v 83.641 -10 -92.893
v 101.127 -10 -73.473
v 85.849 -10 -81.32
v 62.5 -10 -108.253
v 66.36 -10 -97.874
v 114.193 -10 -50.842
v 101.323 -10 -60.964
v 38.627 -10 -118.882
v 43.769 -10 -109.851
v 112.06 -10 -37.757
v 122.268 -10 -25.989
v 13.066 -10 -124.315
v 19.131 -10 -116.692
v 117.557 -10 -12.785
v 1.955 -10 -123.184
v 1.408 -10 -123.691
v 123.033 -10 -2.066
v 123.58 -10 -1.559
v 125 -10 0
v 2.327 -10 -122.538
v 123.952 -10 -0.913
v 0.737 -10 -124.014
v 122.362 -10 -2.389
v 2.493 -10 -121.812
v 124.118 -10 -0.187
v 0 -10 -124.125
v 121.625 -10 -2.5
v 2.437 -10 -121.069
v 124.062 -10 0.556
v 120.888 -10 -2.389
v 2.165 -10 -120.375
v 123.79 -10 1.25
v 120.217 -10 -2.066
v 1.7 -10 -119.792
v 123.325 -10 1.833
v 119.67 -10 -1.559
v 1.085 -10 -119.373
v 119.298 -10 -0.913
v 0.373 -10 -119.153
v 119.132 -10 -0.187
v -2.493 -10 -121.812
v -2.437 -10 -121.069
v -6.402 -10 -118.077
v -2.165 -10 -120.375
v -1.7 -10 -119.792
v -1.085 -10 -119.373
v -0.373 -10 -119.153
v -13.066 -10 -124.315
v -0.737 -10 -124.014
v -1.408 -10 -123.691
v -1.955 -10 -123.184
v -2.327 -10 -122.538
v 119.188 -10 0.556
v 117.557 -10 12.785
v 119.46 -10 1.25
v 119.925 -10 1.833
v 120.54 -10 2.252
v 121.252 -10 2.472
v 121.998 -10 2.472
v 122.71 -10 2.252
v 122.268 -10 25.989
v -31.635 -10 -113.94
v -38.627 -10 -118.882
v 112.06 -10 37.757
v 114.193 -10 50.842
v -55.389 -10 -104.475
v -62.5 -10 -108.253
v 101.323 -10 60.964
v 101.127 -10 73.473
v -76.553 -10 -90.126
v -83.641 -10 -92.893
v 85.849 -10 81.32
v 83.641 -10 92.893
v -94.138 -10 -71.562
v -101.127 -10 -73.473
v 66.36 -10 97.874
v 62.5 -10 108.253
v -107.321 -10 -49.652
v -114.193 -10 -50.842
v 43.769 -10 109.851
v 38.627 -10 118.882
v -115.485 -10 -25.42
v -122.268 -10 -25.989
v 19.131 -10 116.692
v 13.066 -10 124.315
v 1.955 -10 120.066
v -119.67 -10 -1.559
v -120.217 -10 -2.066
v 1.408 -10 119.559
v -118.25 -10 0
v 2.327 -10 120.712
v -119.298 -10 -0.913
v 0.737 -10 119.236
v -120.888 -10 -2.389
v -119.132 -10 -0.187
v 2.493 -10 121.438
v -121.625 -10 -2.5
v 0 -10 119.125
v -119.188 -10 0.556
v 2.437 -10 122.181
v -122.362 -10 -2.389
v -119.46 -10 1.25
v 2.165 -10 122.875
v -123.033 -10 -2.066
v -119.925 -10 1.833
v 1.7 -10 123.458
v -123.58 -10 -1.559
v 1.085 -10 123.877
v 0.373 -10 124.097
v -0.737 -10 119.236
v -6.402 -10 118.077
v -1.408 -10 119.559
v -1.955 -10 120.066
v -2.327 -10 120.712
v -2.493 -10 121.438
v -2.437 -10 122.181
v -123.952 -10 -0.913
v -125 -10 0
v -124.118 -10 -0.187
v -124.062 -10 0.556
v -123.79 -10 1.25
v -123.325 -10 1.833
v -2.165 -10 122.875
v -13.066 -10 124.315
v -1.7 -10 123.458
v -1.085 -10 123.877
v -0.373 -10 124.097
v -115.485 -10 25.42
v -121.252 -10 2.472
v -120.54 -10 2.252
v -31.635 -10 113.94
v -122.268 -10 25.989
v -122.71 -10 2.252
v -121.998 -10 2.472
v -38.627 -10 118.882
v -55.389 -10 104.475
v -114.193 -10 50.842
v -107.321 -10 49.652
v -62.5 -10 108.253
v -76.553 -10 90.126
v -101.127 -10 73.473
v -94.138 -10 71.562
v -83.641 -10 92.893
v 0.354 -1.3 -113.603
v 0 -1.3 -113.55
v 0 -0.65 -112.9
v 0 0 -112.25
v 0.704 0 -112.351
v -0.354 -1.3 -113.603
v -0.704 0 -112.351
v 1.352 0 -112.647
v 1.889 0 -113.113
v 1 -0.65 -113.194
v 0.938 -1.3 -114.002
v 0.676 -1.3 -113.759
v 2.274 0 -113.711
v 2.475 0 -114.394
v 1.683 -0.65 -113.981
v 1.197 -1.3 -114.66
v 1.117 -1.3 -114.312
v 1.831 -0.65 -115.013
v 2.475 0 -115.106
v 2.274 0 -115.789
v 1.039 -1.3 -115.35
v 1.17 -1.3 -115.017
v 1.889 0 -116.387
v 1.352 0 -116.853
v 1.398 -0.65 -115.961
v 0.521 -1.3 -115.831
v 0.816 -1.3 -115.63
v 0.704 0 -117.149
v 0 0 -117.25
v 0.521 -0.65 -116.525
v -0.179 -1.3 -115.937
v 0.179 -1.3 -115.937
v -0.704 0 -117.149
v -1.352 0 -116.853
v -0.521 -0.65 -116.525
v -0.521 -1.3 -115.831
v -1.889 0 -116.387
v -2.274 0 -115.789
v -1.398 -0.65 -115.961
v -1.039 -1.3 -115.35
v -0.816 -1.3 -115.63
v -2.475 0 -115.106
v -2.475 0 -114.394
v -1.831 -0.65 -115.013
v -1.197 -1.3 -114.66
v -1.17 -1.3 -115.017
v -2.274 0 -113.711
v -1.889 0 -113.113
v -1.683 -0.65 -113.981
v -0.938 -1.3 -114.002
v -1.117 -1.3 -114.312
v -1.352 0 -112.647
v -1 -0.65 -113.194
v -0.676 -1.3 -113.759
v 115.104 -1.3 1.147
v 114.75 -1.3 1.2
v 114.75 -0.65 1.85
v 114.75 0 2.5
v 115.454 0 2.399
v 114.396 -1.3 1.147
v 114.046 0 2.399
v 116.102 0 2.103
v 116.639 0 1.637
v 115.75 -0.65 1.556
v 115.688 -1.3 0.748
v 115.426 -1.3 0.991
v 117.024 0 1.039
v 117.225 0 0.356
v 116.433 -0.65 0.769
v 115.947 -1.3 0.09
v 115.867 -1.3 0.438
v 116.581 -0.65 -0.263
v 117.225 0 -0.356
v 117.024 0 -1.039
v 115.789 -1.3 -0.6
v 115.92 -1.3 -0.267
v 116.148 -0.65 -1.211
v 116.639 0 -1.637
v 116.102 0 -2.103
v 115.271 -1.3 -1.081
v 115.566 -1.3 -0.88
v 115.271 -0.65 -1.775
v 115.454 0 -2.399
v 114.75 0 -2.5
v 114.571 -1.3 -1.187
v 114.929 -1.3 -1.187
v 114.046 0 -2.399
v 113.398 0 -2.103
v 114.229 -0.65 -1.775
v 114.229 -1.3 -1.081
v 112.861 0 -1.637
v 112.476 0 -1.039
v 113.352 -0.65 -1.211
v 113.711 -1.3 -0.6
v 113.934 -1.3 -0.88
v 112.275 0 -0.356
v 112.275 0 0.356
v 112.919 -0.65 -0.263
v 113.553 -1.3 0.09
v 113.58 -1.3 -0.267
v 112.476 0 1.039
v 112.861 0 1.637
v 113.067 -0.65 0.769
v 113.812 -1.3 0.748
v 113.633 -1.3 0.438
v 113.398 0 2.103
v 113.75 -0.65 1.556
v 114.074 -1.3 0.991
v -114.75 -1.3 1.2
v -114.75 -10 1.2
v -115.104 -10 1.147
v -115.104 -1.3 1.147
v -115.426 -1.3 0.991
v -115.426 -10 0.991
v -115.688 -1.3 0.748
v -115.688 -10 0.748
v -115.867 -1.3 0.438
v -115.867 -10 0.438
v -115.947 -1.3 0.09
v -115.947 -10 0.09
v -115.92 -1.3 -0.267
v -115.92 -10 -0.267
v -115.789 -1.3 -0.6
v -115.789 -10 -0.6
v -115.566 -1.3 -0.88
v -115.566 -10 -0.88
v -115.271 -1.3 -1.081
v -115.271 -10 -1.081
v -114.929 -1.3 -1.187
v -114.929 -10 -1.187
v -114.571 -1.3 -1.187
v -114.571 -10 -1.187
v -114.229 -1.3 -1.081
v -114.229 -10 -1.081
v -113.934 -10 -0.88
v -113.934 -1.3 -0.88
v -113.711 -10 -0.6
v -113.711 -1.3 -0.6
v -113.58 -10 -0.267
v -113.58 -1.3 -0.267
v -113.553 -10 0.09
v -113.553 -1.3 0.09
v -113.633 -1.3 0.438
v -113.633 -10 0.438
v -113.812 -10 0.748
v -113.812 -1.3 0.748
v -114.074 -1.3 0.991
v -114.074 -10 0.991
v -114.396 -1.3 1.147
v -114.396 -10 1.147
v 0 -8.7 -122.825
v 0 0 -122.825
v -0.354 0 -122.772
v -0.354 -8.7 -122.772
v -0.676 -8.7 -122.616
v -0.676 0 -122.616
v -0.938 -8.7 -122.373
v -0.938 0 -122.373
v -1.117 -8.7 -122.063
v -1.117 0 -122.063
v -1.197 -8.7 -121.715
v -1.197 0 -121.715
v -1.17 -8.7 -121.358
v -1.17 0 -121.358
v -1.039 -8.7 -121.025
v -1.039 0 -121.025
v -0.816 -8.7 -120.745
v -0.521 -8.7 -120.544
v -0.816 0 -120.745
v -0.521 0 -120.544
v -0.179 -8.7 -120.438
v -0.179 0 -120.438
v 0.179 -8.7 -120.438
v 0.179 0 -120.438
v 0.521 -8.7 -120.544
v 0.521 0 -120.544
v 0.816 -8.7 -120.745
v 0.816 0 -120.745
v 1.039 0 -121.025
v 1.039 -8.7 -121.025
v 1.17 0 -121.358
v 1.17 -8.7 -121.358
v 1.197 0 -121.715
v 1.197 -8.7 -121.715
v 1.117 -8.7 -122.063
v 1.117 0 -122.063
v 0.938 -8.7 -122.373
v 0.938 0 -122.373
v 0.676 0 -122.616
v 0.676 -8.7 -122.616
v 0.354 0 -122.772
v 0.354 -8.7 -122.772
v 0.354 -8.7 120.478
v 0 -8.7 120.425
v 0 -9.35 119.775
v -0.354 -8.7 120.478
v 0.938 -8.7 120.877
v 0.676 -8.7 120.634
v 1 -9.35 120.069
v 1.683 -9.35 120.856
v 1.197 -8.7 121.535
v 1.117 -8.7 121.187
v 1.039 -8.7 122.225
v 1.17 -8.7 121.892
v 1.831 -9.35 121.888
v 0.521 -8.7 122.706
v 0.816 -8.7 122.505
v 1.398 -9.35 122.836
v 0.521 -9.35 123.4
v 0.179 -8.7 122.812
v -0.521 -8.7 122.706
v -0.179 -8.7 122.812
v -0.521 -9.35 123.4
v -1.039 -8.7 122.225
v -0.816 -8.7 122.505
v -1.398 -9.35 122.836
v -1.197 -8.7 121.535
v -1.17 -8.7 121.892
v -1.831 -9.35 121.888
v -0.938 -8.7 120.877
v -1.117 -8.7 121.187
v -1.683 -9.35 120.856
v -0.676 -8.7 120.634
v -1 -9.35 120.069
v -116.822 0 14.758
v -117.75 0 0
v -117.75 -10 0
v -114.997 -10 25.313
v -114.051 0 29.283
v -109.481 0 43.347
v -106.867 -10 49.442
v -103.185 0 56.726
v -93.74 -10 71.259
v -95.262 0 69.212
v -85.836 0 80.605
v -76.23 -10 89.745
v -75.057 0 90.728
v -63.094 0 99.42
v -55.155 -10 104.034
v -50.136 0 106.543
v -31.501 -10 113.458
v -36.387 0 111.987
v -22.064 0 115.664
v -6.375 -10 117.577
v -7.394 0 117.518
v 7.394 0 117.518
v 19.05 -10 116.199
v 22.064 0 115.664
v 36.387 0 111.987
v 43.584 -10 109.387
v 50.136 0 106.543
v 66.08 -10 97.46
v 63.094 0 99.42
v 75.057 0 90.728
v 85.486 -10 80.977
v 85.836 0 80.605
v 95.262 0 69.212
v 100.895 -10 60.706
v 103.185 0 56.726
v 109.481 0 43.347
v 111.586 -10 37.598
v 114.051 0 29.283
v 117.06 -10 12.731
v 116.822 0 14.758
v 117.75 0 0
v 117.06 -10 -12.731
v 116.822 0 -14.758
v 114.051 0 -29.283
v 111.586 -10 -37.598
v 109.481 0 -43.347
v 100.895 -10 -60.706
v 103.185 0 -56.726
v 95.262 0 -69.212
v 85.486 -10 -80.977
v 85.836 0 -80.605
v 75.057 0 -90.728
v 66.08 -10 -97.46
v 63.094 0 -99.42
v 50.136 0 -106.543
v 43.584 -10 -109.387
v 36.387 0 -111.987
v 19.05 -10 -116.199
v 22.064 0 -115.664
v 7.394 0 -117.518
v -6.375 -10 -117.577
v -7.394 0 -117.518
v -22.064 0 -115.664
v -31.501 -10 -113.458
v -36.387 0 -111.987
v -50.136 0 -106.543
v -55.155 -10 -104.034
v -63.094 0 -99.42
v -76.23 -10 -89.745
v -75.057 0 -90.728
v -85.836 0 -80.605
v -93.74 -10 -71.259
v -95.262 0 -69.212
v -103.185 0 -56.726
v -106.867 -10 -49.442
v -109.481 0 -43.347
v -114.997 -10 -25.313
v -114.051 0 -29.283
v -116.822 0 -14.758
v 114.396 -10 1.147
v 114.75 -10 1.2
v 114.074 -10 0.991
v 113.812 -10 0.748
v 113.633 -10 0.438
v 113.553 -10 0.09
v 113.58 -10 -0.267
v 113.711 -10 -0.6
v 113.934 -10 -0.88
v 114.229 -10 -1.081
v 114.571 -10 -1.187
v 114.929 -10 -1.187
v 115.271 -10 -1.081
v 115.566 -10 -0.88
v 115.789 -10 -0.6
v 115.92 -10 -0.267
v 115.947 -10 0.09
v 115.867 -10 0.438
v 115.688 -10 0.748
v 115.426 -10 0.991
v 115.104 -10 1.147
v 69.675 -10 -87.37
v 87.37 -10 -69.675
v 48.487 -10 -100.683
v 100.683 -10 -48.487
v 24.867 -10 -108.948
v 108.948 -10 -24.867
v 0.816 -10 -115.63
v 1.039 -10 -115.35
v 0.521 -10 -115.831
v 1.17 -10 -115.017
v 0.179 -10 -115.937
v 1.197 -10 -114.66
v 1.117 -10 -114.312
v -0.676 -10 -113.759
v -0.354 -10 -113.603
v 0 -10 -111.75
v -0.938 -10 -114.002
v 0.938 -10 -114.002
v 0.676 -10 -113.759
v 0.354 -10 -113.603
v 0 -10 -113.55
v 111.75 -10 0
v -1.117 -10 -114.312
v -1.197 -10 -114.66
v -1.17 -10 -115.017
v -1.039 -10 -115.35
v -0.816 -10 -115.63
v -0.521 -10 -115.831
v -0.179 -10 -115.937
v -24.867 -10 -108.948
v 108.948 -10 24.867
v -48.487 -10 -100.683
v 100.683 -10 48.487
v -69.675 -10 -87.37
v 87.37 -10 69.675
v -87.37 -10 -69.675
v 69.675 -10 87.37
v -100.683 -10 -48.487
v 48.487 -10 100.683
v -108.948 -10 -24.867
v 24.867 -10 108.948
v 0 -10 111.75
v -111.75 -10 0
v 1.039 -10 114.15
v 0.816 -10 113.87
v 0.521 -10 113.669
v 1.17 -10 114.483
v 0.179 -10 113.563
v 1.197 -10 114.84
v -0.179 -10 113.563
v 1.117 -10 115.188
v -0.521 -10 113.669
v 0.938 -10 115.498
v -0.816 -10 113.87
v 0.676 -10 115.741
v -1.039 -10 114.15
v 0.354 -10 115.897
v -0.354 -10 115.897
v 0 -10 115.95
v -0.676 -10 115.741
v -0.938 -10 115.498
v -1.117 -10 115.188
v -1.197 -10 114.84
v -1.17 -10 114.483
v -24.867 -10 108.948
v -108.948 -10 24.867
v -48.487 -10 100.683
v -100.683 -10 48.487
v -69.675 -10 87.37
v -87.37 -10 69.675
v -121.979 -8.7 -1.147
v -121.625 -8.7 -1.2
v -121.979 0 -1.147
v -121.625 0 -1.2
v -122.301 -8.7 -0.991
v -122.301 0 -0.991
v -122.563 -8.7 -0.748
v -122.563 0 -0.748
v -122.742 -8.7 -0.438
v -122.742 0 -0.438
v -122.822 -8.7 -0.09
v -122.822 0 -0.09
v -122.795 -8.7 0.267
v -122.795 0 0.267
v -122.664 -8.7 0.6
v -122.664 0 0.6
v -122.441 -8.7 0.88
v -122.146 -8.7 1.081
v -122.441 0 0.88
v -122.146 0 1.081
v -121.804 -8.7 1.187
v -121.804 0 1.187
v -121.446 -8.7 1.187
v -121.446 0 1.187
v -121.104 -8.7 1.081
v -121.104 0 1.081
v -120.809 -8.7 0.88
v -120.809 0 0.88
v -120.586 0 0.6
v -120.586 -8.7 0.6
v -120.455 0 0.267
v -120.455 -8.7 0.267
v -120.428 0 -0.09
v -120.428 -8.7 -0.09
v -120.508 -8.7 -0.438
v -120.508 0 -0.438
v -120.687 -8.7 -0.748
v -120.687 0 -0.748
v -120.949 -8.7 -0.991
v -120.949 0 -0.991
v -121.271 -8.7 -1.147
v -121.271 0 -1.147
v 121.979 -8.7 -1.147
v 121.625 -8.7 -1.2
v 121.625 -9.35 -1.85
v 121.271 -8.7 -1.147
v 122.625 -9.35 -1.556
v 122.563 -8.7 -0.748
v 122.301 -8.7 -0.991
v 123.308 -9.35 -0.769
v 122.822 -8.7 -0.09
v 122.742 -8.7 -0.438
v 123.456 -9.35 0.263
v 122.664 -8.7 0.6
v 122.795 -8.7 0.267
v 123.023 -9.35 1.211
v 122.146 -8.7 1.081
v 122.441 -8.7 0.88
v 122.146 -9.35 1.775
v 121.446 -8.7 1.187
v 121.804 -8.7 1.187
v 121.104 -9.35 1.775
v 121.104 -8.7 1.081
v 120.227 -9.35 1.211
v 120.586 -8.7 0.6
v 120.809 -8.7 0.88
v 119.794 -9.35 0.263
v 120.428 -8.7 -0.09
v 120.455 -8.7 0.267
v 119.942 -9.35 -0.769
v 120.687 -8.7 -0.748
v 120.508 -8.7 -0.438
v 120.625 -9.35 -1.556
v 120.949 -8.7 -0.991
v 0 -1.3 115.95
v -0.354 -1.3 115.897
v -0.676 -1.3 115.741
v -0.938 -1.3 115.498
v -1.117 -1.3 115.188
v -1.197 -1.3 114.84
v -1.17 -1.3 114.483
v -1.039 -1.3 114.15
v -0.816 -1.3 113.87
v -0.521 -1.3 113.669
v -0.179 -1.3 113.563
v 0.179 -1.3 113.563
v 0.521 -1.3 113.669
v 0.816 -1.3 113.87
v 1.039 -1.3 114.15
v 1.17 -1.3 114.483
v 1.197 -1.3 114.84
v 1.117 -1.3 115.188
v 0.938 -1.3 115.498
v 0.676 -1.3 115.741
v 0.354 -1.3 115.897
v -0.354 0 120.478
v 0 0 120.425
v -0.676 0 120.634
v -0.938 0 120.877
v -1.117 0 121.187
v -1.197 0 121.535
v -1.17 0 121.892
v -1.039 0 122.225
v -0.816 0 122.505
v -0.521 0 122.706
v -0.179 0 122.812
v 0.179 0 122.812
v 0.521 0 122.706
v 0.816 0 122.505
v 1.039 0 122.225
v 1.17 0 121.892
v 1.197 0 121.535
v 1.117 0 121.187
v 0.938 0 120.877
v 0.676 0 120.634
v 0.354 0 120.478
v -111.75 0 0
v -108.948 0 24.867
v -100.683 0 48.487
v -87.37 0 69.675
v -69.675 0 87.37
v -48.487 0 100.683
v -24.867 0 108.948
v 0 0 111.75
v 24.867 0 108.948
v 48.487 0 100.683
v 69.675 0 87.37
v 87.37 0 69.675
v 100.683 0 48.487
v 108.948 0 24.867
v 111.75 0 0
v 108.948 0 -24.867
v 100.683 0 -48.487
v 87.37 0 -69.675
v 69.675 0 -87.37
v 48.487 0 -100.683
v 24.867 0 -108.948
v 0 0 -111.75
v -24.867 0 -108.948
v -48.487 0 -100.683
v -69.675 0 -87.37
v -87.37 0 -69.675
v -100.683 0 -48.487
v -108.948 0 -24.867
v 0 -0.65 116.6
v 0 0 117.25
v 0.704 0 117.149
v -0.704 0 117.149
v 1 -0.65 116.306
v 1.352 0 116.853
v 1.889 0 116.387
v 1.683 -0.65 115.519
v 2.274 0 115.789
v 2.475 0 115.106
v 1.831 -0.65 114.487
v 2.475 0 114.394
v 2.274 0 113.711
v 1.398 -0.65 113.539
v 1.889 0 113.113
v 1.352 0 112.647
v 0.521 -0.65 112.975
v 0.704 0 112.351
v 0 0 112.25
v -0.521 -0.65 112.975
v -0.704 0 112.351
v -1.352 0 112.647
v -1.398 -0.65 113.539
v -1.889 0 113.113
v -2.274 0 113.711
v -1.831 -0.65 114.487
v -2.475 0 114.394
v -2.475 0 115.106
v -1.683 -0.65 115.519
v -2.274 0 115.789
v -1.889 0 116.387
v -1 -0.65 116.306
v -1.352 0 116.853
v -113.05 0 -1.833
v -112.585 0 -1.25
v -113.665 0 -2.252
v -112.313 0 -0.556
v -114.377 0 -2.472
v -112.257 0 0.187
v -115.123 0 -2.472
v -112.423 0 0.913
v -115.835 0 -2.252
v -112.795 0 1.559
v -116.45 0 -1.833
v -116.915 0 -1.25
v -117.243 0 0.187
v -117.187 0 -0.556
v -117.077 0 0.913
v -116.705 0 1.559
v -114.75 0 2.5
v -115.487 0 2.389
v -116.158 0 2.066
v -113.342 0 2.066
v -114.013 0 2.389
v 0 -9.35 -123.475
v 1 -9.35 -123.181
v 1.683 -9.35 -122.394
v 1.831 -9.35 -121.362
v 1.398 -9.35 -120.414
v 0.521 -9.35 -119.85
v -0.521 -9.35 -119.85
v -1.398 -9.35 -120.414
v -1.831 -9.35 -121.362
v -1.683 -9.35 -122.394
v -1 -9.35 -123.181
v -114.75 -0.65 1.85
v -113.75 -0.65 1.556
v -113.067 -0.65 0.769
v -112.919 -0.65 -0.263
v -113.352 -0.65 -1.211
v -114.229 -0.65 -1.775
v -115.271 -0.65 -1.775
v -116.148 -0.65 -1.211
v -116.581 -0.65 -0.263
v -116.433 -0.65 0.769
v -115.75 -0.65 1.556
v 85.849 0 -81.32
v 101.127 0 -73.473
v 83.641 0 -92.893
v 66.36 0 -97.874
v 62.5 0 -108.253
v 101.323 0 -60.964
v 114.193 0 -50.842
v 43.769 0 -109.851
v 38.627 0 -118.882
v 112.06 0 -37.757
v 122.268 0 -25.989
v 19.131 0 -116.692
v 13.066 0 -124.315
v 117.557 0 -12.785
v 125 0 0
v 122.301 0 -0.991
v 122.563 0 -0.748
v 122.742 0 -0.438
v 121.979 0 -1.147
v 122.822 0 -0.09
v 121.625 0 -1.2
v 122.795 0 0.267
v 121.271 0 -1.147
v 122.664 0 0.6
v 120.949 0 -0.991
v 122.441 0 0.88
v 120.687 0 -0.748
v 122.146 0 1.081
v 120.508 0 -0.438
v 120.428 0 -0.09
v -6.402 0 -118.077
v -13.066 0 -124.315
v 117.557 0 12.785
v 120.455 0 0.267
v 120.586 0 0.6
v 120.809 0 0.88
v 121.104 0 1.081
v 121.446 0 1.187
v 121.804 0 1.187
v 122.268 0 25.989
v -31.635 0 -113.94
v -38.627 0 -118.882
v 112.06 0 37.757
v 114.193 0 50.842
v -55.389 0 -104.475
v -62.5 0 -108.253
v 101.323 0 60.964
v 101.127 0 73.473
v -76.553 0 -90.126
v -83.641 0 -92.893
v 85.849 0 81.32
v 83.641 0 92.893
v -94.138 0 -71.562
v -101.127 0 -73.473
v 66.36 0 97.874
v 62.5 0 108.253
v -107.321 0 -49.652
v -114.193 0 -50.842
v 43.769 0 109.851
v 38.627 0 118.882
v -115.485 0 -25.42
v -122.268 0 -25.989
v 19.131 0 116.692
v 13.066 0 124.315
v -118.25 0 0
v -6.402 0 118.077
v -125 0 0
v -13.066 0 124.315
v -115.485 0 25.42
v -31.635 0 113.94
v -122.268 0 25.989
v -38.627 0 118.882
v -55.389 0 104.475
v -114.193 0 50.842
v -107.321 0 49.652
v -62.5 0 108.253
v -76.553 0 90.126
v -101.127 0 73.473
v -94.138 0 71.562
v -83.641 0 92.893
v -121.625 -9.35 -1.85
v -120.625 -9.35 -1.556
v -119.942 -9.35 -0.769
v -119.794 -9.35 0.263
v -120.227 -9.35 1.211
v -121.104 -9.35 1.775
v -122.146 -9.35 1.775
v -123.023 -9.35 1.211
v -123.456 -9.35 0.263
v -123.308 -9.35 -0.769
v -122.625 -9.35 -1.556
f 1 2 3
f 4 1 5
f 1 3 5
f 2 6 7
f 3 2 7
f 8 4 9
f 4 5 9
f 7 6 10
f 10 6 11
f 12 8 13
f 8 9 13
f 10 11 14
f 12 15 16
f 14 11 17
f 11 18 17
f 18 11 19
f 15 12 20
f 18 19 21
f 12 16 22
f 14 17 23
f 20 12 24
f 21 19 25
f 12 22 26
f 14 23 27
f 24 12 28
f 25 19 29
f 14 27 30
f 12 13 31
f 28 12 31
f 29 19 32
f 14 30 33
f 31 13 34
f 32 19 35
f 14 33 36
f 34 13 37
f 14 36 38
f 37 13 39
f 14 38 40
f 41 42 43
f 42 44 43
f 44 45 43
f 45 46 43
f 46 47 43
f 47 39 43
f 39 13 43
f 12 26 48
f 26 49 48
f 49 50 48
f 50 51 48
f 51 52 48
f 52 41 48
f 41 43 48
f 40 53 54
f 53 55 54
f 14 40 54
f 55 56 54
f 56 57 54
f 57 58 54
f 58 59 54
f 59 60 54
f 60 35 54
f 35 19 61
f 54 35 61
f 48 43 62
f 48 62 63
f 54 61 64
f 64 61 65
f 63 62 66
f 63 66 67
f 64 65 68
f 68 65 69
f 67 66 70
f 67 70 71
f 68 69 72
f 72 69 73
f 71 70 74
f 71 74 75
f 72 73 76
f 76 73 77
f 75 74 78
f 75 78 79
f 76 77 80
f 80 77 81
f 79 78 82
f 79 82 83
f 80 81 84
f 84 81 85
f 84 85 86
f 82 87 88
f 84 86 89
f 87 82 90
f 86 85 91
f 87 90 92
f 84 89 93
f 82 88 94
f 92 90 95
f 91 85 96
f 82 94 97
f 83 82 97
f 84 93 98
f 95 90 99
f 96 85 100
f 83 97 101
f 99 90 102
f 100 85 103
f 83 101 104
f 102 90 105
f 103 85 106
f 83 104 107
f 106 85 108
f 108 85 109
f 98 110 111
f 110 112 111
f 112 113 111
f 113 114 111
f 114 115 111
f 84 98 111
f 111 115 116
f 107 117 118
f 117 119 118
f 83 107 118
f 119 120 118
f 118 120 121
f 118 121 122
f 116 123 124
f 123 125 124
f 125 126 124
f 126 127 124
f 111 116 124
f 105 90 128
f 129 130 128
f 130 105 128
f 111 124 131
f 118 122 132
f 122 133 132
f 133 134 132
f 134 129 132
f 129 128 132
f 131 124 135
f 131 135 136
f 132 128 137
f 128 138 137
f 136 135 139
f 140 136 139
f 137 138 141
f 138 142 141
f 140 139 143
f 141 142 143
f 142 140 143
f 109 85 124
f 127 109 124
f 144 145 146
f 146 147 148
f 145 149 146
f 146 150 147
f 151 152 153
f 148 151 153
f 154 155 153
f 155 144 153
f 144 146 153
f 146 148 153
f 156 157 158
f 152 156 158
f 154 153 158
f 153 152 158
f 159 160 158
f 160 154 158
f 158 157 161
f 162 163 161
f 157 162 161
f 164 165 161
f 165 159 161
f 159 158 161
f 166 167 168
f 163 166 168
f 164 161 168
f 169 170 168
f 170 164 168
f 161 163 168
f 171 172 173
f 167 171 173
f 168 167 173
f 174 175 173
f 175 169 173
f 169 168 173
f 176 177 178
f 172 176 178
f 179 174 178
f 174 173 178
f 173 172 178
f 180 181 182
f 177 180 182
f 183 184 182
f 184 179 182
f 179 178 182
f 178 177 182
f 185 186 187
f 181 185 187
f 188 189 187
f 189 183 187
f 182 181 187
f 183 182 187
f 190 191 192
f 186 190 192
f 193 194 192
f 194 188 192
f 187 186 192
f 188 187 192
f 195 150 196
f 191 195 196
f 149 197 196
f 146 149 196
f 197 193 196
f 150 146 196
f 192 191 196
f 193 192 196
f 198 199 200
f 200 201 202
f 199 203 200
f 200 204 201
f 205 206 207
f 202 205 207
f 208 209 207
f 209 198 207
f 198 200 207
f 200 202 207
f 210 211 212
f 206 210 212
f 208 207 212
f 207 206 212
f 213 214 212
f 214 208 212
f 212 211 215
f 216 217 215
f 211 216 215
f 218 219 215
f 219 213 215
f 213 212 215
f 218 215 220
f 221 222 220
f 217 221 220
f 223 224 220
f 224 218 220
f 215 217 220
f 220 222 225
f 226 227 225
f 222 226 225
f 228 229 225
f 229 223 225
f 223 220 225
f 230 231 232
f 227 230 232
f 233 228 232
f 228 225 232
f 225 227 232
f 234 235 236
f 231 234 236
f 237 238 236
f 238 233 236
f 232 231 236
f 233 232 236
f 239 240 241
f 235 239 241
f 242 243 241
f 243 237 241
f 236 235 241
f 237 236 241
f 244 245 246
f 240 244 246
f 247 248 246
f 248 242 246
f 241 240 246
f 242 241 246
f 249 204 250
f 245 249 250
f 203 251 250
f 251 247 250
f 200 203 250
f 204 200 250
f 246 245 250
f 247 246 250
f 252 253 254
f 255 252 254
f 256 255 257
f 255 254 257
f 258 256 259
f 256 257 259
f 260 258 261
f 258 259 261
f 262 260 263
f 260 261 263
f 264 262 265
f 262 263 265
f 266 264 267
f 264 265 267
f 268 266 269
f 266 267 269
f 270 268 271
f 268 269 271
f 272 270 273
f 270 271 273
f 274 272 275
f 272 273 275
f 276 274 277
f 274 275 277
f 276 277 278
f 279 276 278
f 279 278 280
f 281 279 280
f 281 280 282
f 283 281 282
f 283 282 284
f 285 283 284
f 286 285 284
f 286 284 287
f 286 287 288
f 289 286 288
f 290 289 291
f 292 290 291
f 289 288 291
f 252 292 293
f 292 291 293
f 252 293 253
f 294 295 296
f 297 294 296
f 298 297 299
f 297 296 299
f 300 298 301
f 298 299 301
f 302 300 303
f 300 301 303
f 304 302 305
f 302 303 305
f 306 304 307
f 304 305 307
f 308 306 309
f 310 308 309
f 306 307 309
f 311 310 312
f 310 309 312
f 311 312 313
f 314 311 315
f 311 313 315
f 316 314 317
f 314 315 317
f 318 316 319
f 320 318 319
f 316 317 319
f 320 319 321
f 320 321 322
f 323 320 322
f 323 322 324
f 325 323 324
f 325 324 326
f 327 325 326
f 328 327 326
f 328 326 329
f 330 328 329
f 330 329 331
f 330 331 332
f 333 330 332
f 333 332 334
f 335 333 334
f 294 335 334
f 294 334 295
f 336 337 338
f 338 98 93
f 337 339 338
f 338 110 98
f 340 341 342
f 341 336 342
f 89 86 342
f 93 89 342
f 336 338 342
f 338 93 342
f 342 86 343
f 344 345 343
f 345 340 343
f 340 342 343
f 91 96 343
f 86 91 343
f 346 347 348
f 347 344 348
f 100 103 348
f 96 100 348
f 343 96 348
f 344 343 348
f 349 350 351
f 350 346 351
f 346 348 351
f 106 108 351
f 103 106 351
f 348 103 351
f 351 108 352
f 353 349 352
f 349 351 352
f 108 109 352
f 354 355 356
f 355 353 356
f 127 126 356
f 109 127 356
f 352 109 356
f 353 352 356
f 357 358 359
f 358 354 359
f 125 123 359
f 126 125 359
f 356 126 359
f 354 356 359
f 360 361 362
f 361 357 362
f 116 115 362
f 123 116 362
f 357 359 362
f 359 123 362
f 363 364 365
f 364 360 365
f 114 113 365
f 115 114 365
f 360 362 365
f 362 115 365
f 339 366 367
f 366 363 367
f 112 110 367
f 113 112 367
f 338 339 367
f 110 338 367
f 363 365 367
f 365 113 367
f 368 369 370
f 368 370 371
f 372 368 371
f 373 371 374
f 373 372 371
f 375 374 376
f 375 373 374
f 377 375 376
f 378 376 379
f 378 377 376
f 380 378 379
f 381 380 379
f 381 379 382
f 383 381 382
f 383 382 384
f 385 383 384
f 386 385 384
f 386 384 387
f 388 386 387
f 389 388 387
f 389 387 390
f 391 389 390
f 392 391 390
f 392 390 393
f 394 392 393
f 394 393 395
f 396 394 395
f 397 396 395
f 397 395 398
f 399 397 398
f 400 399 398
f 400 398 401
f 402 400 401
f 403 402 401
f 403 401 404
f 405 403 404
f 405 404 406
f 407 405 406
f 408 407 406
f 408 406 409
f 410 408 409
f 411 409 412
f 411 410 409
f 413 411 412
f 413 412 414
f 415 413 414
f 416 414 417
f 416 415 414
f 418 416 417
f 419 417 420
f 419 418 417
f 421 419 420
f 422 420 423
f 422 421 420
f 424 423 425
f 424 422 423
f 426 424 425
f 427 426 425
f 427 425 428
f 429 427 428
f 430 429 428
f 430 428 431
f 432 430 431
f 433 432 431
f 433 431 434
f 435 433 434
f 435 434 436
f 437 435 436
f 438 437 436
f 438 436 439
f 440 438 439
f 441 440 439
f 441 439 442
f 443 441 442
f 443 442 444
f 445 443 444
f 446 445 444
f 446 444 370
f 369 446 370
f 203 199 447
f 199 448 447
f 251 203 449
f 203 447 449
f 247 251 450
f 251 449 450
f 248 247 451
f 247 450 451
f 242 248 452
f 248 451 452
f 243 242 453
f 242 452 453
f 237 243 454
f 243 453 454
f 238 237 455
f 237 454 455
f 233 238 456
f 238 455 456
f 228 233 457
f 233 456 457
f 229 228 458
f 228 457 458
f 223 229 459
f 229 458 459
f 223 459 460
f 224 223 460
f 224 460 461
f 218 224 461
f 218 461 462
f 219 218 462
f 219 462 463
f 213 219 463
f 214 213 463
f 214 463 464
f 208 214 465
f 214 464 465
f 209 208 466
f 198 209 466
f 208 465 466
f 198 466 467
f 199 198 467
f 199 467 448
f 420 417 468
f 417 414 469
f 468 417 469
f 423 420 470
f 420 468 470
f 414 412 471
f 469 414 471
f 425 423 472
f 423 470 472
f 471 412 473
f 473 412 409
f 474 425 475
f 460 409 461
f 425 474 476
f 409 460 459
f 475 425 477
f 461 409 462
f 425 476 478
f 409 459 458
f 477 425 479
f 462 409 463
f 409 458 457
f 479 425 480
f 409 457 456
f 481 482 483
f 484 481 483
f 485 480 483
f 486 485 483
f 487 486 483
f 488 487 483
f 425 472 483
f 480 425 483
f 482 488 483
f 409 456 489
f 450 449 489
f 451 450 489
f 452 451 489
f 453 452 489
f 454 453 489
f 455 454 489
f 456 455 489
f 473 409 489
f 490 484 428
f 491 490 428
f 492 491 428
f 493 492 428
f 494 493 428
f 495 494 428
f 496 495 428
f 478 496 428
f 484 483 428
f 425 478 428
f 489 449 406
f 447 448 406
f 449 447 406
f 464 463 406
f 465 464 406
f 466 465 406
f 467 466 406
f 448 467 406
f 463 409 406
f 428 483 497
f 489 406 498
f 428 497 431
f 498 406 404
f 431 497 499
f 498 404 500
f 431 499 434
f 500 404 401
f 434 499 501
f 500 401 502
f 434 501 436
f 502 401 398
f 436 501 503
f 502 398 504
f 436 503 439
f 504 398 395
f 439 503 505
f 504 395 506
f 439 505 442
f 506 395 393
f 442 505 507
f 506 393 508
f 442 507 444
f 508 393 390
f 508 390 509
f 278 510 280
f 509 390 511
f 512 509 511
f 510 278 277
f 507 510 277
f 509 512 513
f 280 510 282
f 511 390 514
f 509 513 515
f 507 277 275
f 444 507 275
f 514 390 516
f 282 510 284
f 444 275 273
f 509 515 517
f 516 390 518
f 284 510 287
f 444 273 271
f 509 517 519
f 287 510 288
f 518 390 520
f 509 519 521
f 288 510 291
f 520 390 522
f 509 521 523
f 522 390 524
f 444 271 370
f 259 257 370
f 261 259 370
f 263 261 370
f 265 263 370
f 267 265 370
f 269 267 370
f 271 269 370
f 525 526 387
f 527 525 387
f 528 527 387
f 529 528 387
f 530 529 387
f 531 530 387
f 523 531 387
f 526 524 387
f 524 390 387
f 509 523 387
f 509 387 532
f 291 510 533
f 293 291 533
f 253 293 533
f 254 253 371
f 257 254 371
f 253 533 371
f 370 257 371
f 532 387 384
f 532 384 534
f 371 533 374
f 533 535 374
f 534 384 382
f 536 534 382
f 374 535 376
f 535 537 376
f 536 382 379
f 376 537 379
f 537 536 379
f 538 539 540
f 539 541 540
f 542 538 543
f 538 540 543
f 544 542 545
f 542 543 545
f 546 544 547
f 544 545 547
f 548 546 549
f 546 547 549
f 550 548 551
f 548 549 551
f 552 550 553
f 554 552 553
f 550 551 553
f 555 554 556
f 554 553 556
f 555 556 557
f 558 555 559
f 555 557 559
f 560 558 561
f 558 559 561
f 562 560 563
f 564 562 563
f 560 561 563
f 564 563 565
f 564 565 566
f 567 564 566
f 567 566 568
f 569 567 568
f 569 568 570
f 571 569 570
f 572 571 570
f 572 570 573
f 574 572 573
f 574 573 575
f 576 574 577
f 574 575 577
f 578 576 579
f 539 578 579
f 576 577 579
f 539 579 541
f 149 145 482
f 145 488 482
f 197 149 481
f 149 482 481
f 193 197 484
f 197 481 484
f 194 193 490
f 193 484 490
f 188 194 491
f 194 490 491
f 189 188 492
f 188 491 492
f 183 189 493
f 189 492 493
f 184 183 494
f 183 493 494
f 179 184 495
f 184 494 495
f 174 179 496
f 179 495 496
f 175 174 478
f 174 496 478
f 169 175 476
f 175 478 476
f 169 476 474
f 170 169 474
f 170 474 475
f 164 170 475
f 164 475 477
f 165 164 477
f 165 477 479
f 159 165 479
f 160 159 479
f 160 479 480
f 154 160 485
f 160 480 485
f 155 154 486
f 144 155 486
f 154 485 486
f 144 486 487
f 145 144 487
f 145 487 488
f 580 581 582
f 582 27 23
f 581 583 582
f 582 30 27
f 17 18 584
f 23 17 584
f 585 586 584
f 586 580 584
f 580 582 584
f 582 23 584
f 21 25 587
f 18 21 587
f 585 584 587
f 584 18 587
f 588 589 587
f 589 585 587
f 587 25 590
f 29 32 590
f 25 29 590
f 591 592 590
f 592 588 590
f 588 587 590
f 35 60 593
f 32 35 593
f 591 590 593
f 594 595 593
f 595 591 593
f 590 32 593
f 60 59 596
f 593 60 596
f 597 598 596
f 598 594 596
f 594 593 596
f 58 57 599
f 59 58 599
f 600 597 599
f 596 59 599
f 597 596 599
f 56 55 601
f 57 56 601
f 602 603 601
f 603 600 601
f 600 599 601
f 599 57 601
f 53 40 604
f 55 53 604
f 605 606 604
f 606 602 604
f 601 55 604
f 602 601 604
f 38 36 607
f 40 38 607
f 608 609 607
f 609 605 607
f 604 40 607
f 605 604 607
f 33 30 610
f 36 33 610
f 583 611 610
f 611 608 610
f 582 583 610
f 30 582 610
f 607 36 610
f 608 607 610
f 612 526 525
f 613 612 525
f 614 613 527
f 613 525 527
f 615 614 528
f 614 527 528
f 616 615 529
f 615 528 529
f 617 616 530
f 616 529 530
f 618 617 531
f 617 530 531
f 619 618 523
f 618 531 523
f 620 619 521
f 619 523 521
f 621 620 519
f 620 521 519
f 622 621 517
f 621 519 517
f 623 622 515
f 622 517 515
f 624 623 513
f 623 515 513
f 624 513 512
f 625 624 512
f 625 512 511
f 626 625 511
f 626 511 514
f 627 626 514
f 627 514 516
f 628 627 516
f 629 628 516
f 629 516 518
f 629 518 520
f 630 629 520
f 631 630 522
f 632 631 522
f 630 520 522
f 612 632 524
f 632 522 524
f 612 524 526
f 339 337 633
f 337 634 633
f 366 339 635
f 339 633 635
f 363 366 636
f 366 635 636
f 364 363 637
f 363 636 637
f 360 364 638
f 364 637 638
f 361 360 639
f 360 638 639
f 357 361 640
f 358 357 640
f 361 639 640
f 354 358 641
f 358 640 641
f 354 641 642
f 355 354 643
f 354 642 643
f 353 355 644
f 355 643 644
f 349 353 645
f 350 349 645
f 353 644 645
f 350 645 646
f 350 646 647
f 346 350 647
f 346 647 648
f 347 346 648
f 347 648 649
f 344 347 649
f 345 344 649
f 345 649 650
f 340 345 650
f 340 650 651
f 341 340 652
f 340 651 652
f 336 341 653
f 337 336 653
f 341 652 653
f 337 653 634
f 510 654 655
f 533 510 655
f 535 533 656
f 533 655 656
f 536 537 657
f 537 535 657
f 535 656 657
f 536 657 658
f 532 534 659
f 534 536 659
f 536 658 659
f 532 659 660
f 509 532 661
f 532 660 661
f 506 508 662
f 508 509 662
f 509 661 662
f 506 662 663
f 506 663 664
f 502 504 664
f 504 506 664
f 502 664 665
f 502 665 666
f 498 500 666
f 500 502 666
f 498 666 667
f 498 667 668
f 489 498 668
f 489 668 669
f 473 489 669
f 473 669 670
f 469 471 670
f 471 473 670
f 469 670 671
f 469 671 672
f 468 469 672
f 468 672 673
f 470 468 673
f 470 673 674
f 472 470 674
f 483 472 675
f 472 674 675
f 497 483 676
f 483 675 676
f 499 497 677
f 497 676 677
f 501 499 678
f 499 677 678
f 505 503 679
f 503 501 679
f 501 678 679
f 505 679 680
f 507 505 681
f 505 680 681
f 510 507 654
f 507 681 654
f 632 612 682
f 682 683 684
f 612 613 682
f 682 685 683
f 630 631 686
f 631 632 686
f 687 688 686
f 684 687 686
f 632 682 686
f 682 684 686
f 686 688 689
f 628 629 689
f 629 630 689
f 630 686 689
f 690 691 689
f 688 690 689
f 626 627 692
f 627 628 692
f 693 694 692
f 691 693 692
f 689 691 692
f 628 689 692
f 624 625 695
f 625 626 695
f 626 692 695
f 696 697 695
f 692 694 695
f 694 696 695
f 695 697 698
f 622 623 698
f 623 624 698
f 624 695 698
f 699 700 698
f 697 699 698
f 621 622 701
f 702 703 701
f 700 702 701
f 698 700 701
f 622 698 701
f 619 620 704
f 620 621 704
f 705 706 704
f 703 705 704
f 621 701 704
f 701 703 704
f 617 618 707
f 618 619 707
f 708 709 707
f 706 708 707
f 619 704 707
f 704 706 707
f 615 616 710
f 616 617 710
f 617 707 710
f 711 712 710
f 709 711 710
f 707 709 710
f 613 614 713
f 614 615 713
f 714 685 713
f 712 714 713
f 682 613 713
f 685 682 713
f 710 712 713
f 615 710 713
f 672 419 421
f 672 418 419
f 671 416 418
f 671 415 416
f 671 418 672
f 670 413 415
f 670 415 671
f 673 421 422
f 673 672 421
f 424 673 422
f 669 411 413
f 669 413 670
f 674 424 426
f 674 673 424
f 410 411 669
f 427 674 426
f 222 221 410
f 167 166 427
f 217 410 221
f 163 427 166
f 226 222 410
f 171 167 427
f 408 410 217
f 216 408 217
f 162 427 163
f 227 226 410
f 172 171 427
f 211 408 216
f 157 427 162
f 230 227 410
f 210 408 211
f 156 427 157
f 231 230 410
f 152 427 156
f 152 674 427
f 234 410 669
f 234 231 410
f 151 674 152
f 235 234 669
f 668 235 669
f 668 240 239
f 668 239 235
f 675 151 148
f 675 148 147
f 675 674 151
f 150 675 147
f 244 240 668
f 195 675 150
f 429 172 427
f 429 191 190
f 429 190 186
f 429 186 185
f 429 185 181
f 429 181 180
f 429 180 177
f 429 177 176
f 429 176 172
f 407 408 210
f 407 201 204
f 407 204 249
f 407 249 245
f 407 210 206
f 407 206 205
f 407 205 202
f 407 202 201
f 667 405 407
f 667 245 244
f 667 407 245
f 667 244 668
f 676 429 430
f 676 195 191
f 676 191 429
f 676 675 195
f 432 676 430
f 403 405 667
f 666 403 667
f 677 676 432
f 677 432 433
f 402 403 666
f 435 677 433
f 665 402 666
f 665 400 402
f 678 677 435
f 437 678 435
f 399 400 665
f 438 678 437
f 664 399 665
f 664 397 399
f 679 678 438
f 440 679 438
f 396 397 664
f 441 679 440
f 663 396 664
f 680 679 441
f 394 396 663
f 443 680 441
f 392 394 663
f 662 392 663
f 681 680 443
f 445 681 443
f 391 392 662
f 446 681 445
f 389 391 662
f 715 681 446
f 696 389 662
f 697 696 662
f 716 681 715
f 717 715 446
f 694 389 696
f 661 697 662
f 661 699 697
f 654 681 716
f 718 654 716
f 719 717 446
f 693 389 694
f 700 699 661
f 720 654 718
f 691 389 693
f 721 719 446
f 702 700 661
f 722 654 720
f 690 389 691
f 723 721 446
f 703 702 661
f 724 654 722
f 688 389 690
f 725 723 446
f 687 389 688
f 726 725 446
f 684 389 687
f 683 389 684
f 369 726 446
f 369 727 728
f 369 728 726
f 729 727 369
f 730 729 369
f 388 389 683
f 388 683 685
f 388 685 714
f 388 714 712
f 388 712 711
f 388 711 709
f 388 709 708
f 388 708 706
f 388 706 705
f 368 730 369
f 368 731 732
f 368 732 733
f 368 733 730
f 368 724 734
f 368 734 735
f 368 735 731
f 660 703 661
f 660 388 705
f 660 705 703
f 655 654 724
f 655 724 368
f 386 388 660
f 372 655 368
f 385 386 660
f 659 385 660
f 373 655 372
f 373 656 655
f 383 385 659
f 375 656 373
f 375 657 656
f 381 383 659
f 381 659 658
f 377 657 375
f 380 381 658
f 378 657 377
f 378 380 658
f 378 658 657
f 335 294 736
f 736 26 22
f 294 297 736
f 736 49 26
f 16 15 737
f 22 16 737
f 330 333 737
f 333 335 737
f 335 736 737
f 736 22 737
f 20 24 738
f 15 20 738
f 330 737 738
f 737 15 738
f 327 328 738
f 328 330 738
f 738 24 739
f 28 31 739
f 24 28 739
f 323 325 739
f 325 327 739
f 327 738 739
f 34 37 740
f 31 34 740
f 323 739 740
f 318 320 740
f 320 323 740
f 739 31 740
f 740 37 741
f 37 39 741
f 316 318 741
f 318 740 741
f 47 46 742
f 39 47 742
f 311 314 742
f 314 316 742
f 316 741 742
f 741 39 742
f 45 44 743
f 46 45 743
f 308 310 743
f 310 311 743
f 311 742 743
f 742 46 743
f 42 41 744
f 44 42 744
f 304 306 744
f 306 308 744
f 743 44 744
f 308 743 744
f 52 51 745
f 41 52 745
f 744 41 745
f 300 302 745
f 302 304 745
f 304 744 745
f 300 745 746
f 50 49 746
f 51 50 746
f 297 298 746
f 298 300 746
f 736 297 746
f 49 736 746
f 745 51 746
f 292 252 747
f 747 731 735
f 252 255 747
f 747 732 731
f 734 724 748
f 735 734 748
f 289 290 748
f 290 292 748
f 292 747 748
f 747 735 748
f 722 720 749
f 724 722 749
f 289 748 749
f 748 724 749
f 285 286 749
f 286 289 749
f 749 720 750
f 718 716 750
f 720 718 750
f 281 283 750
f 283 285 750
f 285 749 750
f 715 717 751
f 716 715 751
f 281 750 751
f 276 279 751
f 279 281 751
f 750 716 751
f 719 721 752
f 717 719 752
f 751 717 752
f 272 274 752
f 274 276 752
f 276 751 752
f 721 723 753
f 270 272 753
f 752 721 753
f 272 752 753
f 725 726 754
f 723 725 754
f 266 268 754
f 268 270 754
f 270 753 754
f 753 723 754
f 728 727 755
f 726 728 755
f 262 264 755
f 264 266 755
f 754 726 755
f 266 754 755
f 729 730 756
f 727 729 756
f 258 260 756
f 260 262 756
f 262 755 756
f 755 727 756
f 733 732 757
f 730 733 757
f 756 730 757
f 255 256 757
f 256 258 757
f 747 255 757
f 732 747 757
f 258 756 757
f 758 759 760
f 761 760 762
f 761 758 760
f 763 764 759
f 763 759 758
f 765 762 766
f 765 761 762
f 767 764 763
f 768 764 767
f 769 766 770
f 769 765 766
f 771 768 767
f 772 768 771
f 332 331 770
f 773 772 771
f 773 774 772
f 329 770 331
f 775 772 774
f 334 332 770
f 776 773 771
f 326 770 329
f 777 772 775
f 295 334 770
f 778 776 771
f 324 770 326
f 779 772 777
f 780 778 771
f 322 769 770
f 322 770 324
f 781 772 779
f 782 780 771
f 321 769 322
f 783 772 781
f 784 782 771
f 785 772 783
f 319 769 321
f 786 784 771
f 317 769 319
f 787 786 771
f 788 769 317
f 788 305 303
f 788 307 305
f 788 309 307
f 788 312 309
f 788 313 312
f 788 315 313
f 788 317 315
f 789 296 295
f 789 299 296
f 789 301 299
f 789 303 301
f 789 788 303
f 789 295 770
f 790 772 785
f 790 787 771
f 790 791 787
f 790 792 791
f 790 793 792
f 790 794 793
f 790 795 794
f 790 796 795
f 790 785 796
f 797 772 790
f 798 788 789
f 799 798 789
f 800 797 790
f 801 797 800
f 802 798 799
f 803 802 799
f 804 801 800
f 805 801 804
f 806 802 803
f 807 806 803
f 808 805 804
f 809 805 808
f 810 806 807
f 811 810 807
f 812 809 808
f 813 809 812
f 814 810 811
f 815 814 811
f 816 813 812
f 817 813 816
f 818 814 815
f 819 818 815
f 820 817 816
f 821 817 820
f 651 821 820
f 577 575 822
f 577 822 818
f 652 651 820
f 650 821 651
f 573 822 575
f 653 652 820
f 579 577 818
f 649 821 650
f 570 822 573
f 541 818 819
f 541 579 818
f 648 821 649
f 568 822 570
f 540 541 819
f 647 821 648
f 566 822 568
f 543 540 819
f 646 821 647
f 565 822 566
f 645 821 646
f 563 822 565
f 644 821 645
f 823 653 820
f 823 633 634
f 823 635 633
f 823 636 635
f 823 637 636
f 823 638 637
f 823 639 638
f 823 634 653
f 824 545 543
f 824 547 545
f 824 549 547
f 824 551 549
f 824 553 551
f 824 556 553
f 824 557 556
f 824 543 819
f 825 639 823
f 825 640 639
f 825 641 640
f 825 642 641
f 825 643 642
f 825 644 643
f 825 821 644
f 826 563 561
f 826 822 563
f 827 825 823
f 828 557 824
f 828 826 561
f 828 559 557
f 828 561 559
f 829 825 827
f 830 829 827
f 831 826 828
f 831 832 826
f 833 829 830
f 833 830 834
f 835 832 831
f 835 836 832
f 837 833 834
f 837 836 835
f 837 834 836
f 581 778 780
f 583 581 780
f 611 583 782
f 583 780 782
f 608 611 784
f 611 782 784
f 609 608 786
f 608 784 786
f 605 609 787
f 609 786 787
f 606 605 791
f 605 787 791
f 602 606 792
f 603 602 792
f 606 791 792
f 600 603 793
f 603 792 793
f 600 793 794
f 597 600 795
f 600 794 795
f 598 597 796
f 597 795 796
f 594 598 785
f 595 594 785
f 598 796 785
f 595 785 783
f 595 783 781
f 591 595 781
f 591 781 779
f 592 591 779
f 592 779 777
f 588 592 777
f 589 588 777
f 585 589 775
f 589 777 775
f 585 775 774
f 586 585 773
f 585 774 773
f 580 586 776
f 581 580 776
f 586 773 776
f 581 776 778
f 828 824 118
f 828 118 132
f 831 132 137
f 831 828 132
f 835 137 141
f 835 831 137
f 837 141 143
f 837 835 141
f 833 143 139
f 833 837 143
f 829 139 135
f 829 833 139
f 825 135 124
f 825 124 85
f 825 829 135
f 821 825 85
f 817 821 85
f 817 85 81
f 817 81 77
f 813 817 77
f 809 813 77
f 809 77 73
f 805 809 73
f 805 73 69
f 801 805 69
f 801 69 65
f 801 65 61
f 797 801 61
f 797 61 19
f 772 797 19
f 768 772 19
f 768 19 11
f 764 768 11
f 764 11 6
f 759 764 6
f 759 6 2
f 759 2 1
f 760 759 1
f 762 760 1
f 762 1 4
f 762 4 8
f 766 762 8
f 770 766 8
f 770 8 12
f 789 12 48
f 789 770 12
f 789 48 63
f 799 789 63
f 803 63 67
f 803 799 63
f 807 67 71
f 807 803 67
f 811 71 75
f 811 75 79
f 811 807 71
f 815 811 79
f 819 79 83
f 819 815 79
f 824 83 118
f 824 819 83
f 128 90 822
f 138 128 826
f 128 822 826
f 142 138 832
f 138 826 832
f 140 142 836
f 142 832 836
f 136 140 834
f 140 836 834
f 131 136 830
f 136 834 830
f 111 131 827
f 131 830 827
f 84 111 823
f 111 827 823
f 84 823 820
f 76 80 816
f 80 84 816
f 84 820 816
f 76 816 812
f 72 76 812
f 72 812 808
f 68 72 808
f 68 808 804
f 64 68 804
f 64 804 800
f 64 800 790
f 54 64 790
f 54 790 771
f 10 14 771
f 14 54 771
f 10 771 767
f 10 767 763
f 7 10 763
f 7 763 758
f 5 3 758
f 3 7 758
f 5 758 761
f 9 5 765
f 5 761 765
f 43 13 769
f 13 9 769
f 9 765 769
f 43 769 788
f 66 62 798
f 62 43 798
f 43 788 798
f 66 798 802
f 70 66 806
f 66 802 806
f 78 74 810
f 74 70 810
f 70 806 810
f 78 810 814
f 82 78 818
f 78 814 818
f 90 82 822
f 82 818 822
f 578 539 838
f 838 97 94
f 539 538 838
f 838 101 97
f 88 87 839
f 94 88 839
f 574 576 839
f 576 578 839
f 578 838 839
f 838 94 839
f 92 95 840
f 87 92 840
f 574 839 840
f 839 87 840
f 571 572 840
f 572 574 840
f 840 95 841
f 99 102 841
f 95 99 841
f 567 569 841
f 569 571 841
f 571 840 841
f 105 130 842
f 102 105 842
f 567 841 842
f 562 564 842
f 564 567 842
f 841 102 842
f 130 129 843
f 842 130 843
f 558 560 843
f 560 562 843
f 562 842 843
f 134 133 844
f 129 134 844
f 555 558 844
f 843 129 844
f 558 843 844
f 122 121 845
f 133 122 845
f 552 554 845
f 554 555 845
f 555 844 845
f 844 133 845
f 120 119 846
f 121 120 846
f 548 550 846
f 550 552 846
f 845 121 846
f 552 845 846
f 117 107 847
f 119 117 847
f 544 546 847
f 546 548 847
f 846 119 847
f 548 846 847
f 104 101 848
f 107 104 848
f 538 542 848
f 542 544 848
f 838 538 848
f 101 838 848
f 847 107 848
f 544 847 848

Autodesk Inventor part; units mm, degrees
ref_plane "YZ Plane" through (0, 0, 0) normal (1, 0, 0) x (0, 1, 0)
ref_plane "XZ Plane" through (0, 0, 0) normal (0, 1, 0) x (-1, 0, 0)
ref_plane "XY Plane" through (0, 0, 0) normal (0, 0, 1) x (1, 0, 0)
sketch "Sketch1" plane through (0, 0, 0) normal (0, 1, 0) x (-1, 0, 0)
  circle A0 centre (0, 0) radius 111.75
  circle A1 centre (0, 0) radius 125
  circle A2 centre (0, 0) radius 117.75
  circle A3 centre (0, 0) radius 118.25
  line L0 (-111.75, 0) -> (-117.75, 0)
  line L1 (-118.25, 0) -> (-125, 0)
  point P0 (-114.75, 0)
  point P1 (-121.625, 0)
  point P2 (0, -121.625)
  point P3 (0, -114.75)
  point P4 (121.625, 0)
  point P5 (114.75, 0)
  point P6 (0, 121.625)
  point P7 (0, 114.75)
  dimension "d0" = 223.5
  dimension "d1" = 250
  dimension "d2" = 235.5
  dimension "d3" = 236.5
  dimension "d34" = 360
extrude "Extrusion1" add sketch "Sketch1" against normal blind 10
hole "Hole3" at (114.75, 0, 0) at (0, 0, -114.75) at (0, 0, 114.75) at (-114.75, 0, 0) direction (0, -1, 0) diameter 2.4 end through all countersink diameter 5 countersink angle 90
sketch "Sketch3" plane through (0, -10, 0) normal (0, -1, 0) x (1, 0, 0)
  point P0 (0, 0)
  point P1 (0, -121.625)
  point P2 (121.625, 0)
  point P3 (0, 121.625)
  point P4 (-121.625, 0)
hole "Hole4" at (0, -10, -121.625) at (121.625, -10, 0) at (0, -10, 121.625) at (-121.625, -10, 0) direction (0, 1, 0) diameter 2.4 end through all countersink diameter 5 countersink angle 90
properties part number "bearing_table"
